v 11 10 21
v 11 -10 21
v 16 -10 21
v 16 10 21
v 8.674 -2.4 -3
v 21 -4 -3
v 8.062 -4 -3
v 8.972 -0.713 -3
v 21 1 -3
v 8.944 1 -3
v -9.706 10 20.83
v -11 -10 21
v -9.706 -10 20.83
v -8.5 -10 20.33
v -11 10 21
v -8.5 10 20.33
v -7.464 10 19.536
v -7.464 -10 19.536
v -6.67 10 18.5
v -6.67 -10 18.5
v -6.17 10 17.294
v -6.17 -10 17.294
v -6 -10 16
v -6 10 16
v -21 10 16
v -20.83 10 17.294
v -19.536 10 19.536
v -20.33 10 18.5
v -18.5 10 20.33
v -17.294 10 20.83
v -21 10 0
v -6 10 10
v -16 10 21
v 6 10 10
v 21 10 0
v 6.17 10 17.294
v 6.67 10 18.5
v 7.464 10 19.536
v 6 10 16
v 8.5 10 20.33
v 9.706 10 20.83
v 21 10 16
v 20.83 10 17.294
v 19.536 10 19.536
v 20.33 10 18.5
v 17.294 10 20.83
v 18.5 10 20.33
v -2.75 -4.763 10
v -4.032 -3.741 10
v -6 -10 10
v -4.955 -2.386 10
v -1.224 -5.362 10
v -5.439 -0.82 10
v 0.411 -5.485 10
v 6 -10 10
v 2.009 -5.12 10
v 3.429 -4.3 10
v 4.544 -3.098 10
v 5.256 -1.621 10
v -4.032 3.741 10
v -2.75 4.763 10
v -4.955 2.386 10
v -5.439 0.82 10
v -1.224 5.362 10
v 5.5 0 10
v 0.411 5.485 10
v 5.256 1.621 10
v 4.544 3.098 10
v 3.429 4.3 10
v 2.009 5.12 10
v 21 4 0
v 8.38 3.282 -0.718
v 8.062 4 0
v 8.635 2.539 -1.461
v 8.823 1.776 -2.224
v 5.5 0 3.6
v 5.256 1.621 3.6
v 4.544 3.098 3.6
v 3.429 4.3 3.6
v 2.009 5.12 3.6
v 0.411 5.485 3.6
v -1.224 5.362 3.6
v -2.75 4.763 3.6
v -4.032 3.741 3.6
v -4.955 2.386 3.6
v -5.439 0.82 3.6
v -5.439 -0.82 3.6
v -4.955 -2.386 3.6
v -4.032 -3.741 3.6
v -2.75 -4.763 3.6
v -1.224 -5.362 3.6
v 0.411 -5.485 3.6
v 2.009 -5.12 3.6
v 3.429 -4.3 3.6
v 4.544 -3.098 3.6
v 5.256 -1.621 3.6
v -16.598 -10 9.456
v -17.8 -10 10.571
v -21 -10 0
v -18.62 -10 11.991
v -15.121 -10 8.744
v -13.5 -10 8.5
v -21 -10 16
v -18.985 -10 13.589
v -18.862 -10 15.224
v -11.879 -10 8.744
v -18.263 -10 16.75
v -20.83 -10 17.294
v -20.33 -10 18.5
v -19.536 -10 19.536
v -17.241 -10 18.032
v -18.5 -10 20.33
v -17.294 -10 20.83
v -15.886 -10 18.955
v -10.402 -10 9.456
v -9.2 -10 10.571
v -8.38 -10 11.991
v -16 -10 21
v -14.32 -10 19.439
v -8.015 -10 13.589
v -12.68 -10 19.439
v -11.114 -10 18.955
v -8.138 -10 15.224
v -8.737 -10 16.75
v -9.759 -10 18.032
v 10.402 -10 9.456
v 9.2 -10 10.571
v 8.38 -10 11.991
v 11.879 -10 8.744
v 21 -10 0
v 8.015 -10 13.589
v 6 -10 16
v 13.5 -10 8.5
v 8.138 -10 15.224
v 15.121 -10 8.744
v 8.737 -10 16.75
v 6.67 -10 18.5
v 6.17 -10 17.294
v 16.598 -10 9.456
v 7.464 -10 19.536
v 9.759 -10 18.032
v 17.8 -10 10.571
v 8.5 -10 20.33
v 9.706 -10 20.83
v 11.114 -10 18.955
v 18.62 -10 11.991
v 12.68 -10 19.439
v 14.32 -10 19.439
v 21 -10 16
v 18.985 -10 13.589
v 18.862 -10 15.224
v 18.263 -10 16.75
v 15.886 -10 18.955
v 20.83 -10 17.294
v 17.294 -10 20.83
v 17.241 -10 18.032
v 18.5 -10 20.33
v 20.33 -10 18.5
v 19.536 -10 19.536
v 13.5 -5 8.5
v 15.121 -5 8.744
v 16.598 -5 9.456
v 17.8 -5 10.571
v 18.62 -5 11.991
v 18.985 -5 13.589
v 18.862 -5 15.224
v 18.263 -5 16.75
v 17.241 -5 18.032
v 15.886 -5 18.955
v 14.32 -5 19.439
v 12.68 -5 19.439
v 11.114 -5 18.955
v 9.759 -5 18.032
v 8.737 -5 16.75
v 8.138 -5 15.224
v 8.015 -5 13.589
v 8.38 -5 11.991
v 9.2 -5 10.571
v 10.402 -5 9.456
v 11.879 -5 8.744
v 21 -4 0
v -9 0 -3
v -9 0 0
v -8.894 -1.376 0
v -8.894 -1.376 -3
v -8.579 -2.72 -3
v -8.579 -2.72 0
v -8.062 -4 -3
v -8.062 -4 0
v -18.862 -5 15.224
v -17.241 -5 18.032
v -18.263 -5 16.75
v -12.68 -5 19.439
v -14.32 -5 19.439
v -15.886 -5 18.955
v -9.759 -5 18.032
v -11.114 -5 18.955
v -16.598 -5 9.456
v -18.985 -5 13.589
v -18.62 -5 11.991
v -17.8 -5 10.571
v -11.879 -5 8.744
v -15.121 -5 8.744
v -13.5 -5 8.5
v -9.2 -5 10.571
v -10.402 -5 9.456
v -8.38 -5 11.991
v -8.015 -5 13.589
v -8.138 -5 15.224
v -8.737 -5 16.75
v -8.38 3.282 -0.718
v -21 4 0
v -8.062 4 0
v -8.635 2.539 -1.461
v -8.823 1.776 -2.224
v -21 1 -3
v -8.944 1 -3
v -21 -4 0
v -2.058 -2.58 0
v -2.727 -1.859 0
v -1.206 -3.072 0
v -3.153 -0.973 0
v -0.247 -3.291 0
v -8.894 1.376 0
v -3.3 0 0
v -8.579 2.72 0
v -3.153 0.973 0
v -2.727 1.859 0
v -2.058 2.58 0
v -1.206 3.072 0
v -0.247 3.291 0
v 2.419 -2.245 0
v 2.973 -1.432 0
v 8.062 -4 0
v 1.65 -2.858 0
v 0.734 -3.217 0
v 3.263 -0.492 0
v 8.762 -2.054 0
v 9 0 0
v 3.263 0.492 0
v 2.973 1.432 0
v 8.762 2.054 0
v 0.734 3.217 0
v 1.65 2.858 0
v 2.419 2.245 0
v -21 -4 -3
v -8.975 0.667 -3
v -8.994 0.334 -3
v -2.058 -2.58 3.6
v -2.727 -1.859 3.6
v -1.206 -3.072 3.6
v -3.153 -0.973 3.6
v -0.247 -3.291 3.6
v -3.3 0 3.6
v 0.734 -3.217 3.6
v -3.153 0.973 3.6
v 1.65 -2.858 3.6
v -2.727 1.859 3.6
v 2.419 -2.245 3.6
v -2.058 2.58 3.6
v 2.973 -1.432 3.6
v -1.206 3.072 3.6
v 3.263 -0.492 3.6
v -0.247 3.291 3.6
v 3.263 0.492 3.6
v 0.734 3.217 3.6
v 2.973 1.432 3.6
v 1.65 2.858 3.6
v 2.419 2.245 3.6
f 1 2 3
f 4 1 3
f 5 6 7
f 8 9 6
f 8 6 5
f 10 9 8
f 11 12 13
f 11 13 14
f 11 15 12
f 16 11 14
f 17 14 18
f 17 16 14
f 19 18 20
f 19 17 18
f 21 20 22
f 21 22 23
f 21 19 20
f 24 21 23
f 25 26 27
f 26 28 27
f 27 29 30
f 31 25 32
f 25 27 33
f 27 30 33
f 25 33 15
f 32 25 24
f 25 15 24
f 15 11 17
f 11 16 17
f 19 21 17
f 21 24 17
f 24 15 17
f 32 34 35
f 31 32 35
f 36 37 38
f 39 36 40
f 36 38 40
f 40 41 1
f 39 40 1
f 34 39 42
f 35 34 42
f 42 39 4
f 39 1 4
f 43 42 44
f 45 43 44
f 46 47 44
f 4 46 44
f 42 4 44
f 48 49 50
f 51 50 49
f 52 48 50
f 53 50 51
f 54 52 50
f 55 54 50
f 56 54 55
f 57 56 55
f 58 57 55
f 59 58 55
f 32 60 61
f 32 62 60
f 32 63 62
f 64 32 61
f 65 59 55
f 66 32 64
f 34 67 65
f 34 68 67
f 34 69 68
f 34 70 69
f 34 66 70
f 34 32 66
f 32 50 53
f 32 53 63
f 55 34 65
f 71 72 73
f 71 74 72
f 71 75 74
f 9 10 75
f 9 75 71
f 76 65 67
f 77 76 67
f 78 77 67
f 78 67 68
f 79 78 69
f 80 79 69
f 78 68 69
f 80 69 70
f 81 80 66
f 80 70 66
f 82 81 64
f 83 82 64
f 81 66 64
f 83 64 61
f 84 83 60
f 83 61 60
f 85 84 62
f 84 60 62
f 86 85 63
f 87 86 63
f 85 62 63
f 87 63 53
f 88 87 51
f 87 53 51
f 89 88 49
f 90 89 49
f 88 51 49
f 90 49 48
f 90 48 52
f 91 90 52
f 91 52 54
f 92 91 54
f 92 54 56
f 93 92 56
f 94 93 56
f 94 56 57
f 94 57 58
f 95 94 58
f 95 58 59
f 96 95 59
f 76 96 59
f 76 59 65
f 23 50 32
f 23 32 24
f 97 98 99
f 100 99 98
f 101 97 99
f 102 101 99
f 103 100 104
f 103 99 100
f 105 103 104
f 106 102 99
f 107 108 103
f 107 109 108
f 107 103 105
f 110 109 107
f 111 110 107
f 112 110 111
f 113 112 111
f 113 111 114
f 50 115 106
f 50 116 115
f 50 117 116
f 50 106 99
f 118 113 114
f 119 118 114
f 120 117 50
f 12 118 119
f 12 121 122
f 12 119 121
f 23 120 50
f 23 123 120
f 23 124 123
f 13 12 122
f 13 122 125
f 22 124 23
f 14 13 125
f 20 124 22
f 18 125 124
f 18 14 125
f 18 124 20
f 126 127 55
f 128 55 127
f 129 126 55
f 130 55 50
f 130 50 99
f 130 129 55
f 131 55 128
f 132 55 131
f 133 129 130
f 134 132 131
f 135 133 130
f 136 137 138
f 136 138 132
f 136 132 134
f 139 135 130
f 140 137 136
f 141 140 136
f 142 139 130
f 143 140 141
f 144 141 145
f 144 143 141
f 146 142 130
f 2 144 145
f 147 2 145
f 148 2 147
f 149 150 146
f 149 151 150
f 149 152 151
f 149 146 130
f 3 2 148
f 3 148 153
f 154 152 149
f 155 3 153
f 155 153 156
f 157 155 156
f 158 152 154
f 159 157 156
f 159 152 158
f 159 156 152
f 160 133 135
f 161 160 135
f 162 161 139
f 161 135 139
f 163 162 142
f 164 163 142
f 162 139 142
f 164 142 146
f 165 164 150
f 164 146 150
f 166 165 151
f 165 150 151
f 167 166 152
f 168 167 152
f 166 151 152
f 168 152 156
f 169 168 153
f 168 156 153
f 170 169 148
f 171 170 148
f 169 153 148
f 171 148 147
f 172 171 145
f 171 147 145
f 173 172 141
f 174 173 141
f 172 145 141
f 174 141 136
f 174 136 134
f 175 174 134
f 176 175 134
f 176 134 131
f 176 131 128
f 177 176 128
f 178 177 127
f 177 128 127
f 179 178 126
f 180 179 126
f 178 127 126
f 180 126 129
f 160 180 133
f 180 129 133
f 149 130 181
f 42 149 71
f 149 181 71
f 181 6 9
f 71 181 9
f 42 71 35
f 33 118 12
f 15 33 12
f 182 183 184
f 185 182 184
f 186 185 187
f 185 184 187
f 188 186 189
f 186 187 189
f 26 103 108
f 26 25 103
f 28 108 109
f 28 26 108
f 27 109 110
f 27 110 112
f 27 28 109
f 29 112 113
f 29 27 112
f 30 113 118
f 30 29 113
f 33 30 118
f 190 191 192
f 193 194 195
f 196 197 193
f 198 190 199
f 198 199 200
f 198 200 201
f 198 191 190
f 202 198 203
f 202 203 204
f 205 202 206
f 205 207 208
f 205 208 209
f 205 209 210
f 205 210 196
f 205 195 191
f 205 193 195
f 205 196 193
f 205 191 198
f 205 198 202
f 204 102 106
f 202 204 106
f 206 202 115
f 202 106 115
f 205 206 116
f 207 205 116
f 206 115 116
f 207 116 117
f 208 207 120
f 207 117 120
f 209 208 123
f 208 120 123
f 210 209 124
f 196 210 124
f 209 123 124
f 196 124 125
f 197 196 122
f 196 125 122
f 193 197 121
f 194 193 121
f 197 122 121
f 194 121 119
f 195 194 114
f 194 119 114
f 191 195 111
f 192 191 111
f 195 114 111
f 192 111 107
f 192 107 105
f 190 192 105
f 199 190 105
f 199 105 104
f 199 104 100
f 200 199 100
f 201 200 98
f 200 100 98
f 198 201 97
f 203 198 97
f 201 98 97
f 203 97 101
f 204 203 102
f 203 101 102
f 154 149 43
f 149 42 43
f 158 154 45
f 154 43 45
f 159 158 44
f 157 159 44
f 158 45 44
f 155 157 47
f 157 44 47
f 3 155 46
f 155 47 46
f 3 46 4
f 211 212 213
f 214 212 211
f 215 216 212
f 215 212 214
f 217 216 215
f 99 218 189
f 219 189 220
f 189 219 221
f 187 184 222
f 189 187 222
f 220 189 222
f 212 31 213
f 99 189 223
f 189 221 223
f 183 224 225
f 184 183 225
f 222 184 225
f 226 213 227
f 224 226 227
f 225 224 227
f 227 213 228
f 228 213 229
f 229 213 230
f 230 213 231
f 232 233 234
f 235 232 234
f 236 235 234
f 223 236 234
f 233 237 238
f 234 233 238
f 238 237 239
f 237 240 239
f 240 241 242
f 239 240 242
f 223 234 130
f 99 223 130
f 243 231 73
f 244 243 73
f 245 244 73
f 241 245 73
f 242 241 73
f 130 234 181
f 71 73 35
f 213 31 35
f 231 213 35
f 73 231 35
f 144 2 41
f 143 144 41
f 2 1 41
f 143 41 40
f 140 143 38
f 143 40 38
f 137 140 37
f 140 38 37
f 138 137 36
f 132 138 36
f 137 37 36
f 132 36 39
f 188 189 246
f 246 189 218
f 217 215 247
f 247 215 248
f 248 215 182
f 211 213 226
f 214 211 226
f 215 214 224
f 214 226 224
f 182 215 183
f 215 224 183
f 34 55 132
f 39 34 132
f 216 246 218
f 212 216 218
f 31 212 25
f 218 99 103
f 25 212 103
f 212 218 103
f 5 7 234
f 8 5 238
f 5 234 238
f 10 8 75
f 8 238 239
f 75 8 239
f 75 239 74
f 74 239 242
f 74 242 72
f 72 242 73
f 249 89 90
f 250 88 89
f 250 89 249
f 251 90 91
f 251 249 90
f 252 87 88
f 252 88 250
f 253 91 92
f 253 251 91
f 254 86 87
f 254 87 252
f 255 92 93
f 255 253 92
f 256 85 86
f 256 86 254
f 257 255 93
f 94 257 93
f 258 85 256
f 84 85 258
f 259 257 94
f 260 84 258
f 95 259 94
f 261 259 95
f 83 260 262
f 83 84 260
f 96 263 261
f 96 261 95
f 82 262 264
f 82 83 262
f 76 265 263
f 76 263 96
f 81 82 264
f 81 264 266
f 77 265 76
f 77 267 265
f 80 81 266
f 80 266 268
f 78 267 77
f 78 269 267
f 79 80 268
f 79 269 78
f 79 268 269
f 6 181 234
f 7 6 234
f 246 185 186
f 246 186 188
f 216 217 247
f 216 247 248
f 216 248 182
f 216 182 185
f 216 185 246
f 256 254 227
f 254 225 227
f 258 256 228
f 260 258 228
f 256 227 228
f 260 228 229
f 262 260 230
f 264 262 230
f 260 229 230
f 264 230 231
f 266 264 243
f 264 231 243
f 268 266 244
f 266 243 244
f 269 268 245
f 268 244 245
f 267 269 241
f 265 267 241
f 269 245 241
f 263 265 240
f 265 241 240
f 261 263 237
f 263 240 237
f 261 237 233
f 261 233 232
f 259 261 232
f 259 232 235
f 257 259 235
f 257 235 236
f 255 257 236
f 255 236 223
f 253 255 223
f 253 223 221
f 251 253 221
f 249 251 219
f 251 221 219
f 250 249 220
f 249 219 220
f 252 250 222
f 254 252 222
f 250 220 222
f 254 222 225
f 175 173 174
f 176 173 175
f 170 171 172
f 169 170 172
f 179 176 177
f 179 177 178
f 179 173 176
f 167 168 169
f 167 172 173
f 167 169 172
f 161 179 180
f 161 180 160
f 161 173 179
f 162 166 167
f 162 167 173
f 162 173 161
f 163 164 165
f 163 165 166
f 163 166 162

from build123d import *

# Parameters (mm, degrees)
BASE_SKETCH_W           = 42
BASE_SKETCH_H           = 20
BASE_DEPTH              = 10
MAGNET_TOWER_SKETCH_W   = 15
MAGNET_TOWER_SKETCH_H   = 11
MAGNET_TOWER_DEPTH      = 20
MAGNET_HOLES_SKETCH_R   = 5.5
MAGNET_HOLES_DEPTH      = 5
MOUNT_SCREW_D           = 6.6
MOUNT_SCREW_CBORE_D     = 11
MOUNT_SCREW_CBORE_DEPTH = 6.4
ROUNDING_R              = 5
PROFILE_CLIP_DEPTH      = 3
PROFILE_CLIP_ANGLE_SIZE = 3


with BuildPart() as part:
    # Base sketch → Base (new body)
    with BuildSketch(Plane.XY):
        Rectangle(BASE_SKETCH_W, BASE_SKETCH_H)
    extrude(amount=BASE_DEPTH)

    # Magnet tower sketch → Magnet tower (add)
    with BuildSketch(Plane.XZ.offset(10)):
        with Locations((-13.5, 15.5)):
            Rectangle(MAGNET_TOWER_SKETCH_W, MAGNET_TOWER_SKETCH_H)
        with Locations((13.5, 15.5)):
            Rectangle(MAGNET_TOWER_SKETCH_W, MAGNET_TOWER_SKETCH_H)
    extrude(amount=-MAGNET_TOWER_DEPTH)

    # Magnet holes sketch → Magnet holes (cut)
    with BuildSketch(Plane.XZ.offset(10)):
        with Locations(Location((-13.5, 14, 0), (0, 0, 270))):
            Circle(MAGNET_HOLES_SKETCH_R)
        with Locations(Location((13.5, 14, 0), (0, 0, 270))):
            Circle(MAGNET_HOLES_SKETCH_R)
    extrude(amount=-MAGNET_HOLES_DEPTH, mode=Mode.SUBTRACT)

    # Mount screw (through all)
    with Locations(Plane.XY.offset(10)):
        with Locations((0, 0)):
            CounterBoreHole(MOUNT_SCREW_D / 2, MOUNT_SCREW_CBORE_D / 2, MOUNT_SCREW_CBORE_DEPTH)

    # Rounding
    rounding_edges = [part.edges().sort_by_distance(p)[0] for p in [
        (-21, 0, 21),
        (-6, 0, 21),
        (21, 0, 21),
        (6, 0, 21),
    ]]
    fillet(rounding_edges, radius=ROUNDING_R)

    # Profile clip sketch → Profile clip (add)
    with BuildSketch(Plane(origin=(0, 0, 0), x_dir=(-1, 0, 0), z_dir=(0, 0, -1))):
        with BuildLine():
            Line((-8.062257748, 4), (-21, 4))
            Line((-21, 4), (-21, -4))
            Line((-21, -4), (-8.062257748, -4))
            ThreePointArc((-8.062257748, -4), (-9, 0), (-8.062257748, 4))
        make_face()
        with BuildLine():
            Line((21, 4), (8.062257748, 4))
            ThreePointArc((8.062257748, 4), (8.762428879, 2.054224947), (9, 0))
            ThreePointArc((9, 0), (8.762428879, -2.054224947), (8.062257748, -4))
            Line((8.062257748, -4), (21, -4))
            Line((21, -4), (21, 4))
        make_face()
    extrude(amount=PROFILE_CLIP_DEPTH)

    # Profile clip angle
    profile_clip_angle_edges = [part.edges().sort_by_distance(p)[0] for p in [
        (-14.531128874, 4, -3),
        (14.531128874, 4, -3),
    ]]
    chamfer(profile_clip_angle_edges, length=PROFILE_CLIP_ANGLE_SIZE - 0.0001)  # a hair under: the kernel refuses the full size


solid = part.part
